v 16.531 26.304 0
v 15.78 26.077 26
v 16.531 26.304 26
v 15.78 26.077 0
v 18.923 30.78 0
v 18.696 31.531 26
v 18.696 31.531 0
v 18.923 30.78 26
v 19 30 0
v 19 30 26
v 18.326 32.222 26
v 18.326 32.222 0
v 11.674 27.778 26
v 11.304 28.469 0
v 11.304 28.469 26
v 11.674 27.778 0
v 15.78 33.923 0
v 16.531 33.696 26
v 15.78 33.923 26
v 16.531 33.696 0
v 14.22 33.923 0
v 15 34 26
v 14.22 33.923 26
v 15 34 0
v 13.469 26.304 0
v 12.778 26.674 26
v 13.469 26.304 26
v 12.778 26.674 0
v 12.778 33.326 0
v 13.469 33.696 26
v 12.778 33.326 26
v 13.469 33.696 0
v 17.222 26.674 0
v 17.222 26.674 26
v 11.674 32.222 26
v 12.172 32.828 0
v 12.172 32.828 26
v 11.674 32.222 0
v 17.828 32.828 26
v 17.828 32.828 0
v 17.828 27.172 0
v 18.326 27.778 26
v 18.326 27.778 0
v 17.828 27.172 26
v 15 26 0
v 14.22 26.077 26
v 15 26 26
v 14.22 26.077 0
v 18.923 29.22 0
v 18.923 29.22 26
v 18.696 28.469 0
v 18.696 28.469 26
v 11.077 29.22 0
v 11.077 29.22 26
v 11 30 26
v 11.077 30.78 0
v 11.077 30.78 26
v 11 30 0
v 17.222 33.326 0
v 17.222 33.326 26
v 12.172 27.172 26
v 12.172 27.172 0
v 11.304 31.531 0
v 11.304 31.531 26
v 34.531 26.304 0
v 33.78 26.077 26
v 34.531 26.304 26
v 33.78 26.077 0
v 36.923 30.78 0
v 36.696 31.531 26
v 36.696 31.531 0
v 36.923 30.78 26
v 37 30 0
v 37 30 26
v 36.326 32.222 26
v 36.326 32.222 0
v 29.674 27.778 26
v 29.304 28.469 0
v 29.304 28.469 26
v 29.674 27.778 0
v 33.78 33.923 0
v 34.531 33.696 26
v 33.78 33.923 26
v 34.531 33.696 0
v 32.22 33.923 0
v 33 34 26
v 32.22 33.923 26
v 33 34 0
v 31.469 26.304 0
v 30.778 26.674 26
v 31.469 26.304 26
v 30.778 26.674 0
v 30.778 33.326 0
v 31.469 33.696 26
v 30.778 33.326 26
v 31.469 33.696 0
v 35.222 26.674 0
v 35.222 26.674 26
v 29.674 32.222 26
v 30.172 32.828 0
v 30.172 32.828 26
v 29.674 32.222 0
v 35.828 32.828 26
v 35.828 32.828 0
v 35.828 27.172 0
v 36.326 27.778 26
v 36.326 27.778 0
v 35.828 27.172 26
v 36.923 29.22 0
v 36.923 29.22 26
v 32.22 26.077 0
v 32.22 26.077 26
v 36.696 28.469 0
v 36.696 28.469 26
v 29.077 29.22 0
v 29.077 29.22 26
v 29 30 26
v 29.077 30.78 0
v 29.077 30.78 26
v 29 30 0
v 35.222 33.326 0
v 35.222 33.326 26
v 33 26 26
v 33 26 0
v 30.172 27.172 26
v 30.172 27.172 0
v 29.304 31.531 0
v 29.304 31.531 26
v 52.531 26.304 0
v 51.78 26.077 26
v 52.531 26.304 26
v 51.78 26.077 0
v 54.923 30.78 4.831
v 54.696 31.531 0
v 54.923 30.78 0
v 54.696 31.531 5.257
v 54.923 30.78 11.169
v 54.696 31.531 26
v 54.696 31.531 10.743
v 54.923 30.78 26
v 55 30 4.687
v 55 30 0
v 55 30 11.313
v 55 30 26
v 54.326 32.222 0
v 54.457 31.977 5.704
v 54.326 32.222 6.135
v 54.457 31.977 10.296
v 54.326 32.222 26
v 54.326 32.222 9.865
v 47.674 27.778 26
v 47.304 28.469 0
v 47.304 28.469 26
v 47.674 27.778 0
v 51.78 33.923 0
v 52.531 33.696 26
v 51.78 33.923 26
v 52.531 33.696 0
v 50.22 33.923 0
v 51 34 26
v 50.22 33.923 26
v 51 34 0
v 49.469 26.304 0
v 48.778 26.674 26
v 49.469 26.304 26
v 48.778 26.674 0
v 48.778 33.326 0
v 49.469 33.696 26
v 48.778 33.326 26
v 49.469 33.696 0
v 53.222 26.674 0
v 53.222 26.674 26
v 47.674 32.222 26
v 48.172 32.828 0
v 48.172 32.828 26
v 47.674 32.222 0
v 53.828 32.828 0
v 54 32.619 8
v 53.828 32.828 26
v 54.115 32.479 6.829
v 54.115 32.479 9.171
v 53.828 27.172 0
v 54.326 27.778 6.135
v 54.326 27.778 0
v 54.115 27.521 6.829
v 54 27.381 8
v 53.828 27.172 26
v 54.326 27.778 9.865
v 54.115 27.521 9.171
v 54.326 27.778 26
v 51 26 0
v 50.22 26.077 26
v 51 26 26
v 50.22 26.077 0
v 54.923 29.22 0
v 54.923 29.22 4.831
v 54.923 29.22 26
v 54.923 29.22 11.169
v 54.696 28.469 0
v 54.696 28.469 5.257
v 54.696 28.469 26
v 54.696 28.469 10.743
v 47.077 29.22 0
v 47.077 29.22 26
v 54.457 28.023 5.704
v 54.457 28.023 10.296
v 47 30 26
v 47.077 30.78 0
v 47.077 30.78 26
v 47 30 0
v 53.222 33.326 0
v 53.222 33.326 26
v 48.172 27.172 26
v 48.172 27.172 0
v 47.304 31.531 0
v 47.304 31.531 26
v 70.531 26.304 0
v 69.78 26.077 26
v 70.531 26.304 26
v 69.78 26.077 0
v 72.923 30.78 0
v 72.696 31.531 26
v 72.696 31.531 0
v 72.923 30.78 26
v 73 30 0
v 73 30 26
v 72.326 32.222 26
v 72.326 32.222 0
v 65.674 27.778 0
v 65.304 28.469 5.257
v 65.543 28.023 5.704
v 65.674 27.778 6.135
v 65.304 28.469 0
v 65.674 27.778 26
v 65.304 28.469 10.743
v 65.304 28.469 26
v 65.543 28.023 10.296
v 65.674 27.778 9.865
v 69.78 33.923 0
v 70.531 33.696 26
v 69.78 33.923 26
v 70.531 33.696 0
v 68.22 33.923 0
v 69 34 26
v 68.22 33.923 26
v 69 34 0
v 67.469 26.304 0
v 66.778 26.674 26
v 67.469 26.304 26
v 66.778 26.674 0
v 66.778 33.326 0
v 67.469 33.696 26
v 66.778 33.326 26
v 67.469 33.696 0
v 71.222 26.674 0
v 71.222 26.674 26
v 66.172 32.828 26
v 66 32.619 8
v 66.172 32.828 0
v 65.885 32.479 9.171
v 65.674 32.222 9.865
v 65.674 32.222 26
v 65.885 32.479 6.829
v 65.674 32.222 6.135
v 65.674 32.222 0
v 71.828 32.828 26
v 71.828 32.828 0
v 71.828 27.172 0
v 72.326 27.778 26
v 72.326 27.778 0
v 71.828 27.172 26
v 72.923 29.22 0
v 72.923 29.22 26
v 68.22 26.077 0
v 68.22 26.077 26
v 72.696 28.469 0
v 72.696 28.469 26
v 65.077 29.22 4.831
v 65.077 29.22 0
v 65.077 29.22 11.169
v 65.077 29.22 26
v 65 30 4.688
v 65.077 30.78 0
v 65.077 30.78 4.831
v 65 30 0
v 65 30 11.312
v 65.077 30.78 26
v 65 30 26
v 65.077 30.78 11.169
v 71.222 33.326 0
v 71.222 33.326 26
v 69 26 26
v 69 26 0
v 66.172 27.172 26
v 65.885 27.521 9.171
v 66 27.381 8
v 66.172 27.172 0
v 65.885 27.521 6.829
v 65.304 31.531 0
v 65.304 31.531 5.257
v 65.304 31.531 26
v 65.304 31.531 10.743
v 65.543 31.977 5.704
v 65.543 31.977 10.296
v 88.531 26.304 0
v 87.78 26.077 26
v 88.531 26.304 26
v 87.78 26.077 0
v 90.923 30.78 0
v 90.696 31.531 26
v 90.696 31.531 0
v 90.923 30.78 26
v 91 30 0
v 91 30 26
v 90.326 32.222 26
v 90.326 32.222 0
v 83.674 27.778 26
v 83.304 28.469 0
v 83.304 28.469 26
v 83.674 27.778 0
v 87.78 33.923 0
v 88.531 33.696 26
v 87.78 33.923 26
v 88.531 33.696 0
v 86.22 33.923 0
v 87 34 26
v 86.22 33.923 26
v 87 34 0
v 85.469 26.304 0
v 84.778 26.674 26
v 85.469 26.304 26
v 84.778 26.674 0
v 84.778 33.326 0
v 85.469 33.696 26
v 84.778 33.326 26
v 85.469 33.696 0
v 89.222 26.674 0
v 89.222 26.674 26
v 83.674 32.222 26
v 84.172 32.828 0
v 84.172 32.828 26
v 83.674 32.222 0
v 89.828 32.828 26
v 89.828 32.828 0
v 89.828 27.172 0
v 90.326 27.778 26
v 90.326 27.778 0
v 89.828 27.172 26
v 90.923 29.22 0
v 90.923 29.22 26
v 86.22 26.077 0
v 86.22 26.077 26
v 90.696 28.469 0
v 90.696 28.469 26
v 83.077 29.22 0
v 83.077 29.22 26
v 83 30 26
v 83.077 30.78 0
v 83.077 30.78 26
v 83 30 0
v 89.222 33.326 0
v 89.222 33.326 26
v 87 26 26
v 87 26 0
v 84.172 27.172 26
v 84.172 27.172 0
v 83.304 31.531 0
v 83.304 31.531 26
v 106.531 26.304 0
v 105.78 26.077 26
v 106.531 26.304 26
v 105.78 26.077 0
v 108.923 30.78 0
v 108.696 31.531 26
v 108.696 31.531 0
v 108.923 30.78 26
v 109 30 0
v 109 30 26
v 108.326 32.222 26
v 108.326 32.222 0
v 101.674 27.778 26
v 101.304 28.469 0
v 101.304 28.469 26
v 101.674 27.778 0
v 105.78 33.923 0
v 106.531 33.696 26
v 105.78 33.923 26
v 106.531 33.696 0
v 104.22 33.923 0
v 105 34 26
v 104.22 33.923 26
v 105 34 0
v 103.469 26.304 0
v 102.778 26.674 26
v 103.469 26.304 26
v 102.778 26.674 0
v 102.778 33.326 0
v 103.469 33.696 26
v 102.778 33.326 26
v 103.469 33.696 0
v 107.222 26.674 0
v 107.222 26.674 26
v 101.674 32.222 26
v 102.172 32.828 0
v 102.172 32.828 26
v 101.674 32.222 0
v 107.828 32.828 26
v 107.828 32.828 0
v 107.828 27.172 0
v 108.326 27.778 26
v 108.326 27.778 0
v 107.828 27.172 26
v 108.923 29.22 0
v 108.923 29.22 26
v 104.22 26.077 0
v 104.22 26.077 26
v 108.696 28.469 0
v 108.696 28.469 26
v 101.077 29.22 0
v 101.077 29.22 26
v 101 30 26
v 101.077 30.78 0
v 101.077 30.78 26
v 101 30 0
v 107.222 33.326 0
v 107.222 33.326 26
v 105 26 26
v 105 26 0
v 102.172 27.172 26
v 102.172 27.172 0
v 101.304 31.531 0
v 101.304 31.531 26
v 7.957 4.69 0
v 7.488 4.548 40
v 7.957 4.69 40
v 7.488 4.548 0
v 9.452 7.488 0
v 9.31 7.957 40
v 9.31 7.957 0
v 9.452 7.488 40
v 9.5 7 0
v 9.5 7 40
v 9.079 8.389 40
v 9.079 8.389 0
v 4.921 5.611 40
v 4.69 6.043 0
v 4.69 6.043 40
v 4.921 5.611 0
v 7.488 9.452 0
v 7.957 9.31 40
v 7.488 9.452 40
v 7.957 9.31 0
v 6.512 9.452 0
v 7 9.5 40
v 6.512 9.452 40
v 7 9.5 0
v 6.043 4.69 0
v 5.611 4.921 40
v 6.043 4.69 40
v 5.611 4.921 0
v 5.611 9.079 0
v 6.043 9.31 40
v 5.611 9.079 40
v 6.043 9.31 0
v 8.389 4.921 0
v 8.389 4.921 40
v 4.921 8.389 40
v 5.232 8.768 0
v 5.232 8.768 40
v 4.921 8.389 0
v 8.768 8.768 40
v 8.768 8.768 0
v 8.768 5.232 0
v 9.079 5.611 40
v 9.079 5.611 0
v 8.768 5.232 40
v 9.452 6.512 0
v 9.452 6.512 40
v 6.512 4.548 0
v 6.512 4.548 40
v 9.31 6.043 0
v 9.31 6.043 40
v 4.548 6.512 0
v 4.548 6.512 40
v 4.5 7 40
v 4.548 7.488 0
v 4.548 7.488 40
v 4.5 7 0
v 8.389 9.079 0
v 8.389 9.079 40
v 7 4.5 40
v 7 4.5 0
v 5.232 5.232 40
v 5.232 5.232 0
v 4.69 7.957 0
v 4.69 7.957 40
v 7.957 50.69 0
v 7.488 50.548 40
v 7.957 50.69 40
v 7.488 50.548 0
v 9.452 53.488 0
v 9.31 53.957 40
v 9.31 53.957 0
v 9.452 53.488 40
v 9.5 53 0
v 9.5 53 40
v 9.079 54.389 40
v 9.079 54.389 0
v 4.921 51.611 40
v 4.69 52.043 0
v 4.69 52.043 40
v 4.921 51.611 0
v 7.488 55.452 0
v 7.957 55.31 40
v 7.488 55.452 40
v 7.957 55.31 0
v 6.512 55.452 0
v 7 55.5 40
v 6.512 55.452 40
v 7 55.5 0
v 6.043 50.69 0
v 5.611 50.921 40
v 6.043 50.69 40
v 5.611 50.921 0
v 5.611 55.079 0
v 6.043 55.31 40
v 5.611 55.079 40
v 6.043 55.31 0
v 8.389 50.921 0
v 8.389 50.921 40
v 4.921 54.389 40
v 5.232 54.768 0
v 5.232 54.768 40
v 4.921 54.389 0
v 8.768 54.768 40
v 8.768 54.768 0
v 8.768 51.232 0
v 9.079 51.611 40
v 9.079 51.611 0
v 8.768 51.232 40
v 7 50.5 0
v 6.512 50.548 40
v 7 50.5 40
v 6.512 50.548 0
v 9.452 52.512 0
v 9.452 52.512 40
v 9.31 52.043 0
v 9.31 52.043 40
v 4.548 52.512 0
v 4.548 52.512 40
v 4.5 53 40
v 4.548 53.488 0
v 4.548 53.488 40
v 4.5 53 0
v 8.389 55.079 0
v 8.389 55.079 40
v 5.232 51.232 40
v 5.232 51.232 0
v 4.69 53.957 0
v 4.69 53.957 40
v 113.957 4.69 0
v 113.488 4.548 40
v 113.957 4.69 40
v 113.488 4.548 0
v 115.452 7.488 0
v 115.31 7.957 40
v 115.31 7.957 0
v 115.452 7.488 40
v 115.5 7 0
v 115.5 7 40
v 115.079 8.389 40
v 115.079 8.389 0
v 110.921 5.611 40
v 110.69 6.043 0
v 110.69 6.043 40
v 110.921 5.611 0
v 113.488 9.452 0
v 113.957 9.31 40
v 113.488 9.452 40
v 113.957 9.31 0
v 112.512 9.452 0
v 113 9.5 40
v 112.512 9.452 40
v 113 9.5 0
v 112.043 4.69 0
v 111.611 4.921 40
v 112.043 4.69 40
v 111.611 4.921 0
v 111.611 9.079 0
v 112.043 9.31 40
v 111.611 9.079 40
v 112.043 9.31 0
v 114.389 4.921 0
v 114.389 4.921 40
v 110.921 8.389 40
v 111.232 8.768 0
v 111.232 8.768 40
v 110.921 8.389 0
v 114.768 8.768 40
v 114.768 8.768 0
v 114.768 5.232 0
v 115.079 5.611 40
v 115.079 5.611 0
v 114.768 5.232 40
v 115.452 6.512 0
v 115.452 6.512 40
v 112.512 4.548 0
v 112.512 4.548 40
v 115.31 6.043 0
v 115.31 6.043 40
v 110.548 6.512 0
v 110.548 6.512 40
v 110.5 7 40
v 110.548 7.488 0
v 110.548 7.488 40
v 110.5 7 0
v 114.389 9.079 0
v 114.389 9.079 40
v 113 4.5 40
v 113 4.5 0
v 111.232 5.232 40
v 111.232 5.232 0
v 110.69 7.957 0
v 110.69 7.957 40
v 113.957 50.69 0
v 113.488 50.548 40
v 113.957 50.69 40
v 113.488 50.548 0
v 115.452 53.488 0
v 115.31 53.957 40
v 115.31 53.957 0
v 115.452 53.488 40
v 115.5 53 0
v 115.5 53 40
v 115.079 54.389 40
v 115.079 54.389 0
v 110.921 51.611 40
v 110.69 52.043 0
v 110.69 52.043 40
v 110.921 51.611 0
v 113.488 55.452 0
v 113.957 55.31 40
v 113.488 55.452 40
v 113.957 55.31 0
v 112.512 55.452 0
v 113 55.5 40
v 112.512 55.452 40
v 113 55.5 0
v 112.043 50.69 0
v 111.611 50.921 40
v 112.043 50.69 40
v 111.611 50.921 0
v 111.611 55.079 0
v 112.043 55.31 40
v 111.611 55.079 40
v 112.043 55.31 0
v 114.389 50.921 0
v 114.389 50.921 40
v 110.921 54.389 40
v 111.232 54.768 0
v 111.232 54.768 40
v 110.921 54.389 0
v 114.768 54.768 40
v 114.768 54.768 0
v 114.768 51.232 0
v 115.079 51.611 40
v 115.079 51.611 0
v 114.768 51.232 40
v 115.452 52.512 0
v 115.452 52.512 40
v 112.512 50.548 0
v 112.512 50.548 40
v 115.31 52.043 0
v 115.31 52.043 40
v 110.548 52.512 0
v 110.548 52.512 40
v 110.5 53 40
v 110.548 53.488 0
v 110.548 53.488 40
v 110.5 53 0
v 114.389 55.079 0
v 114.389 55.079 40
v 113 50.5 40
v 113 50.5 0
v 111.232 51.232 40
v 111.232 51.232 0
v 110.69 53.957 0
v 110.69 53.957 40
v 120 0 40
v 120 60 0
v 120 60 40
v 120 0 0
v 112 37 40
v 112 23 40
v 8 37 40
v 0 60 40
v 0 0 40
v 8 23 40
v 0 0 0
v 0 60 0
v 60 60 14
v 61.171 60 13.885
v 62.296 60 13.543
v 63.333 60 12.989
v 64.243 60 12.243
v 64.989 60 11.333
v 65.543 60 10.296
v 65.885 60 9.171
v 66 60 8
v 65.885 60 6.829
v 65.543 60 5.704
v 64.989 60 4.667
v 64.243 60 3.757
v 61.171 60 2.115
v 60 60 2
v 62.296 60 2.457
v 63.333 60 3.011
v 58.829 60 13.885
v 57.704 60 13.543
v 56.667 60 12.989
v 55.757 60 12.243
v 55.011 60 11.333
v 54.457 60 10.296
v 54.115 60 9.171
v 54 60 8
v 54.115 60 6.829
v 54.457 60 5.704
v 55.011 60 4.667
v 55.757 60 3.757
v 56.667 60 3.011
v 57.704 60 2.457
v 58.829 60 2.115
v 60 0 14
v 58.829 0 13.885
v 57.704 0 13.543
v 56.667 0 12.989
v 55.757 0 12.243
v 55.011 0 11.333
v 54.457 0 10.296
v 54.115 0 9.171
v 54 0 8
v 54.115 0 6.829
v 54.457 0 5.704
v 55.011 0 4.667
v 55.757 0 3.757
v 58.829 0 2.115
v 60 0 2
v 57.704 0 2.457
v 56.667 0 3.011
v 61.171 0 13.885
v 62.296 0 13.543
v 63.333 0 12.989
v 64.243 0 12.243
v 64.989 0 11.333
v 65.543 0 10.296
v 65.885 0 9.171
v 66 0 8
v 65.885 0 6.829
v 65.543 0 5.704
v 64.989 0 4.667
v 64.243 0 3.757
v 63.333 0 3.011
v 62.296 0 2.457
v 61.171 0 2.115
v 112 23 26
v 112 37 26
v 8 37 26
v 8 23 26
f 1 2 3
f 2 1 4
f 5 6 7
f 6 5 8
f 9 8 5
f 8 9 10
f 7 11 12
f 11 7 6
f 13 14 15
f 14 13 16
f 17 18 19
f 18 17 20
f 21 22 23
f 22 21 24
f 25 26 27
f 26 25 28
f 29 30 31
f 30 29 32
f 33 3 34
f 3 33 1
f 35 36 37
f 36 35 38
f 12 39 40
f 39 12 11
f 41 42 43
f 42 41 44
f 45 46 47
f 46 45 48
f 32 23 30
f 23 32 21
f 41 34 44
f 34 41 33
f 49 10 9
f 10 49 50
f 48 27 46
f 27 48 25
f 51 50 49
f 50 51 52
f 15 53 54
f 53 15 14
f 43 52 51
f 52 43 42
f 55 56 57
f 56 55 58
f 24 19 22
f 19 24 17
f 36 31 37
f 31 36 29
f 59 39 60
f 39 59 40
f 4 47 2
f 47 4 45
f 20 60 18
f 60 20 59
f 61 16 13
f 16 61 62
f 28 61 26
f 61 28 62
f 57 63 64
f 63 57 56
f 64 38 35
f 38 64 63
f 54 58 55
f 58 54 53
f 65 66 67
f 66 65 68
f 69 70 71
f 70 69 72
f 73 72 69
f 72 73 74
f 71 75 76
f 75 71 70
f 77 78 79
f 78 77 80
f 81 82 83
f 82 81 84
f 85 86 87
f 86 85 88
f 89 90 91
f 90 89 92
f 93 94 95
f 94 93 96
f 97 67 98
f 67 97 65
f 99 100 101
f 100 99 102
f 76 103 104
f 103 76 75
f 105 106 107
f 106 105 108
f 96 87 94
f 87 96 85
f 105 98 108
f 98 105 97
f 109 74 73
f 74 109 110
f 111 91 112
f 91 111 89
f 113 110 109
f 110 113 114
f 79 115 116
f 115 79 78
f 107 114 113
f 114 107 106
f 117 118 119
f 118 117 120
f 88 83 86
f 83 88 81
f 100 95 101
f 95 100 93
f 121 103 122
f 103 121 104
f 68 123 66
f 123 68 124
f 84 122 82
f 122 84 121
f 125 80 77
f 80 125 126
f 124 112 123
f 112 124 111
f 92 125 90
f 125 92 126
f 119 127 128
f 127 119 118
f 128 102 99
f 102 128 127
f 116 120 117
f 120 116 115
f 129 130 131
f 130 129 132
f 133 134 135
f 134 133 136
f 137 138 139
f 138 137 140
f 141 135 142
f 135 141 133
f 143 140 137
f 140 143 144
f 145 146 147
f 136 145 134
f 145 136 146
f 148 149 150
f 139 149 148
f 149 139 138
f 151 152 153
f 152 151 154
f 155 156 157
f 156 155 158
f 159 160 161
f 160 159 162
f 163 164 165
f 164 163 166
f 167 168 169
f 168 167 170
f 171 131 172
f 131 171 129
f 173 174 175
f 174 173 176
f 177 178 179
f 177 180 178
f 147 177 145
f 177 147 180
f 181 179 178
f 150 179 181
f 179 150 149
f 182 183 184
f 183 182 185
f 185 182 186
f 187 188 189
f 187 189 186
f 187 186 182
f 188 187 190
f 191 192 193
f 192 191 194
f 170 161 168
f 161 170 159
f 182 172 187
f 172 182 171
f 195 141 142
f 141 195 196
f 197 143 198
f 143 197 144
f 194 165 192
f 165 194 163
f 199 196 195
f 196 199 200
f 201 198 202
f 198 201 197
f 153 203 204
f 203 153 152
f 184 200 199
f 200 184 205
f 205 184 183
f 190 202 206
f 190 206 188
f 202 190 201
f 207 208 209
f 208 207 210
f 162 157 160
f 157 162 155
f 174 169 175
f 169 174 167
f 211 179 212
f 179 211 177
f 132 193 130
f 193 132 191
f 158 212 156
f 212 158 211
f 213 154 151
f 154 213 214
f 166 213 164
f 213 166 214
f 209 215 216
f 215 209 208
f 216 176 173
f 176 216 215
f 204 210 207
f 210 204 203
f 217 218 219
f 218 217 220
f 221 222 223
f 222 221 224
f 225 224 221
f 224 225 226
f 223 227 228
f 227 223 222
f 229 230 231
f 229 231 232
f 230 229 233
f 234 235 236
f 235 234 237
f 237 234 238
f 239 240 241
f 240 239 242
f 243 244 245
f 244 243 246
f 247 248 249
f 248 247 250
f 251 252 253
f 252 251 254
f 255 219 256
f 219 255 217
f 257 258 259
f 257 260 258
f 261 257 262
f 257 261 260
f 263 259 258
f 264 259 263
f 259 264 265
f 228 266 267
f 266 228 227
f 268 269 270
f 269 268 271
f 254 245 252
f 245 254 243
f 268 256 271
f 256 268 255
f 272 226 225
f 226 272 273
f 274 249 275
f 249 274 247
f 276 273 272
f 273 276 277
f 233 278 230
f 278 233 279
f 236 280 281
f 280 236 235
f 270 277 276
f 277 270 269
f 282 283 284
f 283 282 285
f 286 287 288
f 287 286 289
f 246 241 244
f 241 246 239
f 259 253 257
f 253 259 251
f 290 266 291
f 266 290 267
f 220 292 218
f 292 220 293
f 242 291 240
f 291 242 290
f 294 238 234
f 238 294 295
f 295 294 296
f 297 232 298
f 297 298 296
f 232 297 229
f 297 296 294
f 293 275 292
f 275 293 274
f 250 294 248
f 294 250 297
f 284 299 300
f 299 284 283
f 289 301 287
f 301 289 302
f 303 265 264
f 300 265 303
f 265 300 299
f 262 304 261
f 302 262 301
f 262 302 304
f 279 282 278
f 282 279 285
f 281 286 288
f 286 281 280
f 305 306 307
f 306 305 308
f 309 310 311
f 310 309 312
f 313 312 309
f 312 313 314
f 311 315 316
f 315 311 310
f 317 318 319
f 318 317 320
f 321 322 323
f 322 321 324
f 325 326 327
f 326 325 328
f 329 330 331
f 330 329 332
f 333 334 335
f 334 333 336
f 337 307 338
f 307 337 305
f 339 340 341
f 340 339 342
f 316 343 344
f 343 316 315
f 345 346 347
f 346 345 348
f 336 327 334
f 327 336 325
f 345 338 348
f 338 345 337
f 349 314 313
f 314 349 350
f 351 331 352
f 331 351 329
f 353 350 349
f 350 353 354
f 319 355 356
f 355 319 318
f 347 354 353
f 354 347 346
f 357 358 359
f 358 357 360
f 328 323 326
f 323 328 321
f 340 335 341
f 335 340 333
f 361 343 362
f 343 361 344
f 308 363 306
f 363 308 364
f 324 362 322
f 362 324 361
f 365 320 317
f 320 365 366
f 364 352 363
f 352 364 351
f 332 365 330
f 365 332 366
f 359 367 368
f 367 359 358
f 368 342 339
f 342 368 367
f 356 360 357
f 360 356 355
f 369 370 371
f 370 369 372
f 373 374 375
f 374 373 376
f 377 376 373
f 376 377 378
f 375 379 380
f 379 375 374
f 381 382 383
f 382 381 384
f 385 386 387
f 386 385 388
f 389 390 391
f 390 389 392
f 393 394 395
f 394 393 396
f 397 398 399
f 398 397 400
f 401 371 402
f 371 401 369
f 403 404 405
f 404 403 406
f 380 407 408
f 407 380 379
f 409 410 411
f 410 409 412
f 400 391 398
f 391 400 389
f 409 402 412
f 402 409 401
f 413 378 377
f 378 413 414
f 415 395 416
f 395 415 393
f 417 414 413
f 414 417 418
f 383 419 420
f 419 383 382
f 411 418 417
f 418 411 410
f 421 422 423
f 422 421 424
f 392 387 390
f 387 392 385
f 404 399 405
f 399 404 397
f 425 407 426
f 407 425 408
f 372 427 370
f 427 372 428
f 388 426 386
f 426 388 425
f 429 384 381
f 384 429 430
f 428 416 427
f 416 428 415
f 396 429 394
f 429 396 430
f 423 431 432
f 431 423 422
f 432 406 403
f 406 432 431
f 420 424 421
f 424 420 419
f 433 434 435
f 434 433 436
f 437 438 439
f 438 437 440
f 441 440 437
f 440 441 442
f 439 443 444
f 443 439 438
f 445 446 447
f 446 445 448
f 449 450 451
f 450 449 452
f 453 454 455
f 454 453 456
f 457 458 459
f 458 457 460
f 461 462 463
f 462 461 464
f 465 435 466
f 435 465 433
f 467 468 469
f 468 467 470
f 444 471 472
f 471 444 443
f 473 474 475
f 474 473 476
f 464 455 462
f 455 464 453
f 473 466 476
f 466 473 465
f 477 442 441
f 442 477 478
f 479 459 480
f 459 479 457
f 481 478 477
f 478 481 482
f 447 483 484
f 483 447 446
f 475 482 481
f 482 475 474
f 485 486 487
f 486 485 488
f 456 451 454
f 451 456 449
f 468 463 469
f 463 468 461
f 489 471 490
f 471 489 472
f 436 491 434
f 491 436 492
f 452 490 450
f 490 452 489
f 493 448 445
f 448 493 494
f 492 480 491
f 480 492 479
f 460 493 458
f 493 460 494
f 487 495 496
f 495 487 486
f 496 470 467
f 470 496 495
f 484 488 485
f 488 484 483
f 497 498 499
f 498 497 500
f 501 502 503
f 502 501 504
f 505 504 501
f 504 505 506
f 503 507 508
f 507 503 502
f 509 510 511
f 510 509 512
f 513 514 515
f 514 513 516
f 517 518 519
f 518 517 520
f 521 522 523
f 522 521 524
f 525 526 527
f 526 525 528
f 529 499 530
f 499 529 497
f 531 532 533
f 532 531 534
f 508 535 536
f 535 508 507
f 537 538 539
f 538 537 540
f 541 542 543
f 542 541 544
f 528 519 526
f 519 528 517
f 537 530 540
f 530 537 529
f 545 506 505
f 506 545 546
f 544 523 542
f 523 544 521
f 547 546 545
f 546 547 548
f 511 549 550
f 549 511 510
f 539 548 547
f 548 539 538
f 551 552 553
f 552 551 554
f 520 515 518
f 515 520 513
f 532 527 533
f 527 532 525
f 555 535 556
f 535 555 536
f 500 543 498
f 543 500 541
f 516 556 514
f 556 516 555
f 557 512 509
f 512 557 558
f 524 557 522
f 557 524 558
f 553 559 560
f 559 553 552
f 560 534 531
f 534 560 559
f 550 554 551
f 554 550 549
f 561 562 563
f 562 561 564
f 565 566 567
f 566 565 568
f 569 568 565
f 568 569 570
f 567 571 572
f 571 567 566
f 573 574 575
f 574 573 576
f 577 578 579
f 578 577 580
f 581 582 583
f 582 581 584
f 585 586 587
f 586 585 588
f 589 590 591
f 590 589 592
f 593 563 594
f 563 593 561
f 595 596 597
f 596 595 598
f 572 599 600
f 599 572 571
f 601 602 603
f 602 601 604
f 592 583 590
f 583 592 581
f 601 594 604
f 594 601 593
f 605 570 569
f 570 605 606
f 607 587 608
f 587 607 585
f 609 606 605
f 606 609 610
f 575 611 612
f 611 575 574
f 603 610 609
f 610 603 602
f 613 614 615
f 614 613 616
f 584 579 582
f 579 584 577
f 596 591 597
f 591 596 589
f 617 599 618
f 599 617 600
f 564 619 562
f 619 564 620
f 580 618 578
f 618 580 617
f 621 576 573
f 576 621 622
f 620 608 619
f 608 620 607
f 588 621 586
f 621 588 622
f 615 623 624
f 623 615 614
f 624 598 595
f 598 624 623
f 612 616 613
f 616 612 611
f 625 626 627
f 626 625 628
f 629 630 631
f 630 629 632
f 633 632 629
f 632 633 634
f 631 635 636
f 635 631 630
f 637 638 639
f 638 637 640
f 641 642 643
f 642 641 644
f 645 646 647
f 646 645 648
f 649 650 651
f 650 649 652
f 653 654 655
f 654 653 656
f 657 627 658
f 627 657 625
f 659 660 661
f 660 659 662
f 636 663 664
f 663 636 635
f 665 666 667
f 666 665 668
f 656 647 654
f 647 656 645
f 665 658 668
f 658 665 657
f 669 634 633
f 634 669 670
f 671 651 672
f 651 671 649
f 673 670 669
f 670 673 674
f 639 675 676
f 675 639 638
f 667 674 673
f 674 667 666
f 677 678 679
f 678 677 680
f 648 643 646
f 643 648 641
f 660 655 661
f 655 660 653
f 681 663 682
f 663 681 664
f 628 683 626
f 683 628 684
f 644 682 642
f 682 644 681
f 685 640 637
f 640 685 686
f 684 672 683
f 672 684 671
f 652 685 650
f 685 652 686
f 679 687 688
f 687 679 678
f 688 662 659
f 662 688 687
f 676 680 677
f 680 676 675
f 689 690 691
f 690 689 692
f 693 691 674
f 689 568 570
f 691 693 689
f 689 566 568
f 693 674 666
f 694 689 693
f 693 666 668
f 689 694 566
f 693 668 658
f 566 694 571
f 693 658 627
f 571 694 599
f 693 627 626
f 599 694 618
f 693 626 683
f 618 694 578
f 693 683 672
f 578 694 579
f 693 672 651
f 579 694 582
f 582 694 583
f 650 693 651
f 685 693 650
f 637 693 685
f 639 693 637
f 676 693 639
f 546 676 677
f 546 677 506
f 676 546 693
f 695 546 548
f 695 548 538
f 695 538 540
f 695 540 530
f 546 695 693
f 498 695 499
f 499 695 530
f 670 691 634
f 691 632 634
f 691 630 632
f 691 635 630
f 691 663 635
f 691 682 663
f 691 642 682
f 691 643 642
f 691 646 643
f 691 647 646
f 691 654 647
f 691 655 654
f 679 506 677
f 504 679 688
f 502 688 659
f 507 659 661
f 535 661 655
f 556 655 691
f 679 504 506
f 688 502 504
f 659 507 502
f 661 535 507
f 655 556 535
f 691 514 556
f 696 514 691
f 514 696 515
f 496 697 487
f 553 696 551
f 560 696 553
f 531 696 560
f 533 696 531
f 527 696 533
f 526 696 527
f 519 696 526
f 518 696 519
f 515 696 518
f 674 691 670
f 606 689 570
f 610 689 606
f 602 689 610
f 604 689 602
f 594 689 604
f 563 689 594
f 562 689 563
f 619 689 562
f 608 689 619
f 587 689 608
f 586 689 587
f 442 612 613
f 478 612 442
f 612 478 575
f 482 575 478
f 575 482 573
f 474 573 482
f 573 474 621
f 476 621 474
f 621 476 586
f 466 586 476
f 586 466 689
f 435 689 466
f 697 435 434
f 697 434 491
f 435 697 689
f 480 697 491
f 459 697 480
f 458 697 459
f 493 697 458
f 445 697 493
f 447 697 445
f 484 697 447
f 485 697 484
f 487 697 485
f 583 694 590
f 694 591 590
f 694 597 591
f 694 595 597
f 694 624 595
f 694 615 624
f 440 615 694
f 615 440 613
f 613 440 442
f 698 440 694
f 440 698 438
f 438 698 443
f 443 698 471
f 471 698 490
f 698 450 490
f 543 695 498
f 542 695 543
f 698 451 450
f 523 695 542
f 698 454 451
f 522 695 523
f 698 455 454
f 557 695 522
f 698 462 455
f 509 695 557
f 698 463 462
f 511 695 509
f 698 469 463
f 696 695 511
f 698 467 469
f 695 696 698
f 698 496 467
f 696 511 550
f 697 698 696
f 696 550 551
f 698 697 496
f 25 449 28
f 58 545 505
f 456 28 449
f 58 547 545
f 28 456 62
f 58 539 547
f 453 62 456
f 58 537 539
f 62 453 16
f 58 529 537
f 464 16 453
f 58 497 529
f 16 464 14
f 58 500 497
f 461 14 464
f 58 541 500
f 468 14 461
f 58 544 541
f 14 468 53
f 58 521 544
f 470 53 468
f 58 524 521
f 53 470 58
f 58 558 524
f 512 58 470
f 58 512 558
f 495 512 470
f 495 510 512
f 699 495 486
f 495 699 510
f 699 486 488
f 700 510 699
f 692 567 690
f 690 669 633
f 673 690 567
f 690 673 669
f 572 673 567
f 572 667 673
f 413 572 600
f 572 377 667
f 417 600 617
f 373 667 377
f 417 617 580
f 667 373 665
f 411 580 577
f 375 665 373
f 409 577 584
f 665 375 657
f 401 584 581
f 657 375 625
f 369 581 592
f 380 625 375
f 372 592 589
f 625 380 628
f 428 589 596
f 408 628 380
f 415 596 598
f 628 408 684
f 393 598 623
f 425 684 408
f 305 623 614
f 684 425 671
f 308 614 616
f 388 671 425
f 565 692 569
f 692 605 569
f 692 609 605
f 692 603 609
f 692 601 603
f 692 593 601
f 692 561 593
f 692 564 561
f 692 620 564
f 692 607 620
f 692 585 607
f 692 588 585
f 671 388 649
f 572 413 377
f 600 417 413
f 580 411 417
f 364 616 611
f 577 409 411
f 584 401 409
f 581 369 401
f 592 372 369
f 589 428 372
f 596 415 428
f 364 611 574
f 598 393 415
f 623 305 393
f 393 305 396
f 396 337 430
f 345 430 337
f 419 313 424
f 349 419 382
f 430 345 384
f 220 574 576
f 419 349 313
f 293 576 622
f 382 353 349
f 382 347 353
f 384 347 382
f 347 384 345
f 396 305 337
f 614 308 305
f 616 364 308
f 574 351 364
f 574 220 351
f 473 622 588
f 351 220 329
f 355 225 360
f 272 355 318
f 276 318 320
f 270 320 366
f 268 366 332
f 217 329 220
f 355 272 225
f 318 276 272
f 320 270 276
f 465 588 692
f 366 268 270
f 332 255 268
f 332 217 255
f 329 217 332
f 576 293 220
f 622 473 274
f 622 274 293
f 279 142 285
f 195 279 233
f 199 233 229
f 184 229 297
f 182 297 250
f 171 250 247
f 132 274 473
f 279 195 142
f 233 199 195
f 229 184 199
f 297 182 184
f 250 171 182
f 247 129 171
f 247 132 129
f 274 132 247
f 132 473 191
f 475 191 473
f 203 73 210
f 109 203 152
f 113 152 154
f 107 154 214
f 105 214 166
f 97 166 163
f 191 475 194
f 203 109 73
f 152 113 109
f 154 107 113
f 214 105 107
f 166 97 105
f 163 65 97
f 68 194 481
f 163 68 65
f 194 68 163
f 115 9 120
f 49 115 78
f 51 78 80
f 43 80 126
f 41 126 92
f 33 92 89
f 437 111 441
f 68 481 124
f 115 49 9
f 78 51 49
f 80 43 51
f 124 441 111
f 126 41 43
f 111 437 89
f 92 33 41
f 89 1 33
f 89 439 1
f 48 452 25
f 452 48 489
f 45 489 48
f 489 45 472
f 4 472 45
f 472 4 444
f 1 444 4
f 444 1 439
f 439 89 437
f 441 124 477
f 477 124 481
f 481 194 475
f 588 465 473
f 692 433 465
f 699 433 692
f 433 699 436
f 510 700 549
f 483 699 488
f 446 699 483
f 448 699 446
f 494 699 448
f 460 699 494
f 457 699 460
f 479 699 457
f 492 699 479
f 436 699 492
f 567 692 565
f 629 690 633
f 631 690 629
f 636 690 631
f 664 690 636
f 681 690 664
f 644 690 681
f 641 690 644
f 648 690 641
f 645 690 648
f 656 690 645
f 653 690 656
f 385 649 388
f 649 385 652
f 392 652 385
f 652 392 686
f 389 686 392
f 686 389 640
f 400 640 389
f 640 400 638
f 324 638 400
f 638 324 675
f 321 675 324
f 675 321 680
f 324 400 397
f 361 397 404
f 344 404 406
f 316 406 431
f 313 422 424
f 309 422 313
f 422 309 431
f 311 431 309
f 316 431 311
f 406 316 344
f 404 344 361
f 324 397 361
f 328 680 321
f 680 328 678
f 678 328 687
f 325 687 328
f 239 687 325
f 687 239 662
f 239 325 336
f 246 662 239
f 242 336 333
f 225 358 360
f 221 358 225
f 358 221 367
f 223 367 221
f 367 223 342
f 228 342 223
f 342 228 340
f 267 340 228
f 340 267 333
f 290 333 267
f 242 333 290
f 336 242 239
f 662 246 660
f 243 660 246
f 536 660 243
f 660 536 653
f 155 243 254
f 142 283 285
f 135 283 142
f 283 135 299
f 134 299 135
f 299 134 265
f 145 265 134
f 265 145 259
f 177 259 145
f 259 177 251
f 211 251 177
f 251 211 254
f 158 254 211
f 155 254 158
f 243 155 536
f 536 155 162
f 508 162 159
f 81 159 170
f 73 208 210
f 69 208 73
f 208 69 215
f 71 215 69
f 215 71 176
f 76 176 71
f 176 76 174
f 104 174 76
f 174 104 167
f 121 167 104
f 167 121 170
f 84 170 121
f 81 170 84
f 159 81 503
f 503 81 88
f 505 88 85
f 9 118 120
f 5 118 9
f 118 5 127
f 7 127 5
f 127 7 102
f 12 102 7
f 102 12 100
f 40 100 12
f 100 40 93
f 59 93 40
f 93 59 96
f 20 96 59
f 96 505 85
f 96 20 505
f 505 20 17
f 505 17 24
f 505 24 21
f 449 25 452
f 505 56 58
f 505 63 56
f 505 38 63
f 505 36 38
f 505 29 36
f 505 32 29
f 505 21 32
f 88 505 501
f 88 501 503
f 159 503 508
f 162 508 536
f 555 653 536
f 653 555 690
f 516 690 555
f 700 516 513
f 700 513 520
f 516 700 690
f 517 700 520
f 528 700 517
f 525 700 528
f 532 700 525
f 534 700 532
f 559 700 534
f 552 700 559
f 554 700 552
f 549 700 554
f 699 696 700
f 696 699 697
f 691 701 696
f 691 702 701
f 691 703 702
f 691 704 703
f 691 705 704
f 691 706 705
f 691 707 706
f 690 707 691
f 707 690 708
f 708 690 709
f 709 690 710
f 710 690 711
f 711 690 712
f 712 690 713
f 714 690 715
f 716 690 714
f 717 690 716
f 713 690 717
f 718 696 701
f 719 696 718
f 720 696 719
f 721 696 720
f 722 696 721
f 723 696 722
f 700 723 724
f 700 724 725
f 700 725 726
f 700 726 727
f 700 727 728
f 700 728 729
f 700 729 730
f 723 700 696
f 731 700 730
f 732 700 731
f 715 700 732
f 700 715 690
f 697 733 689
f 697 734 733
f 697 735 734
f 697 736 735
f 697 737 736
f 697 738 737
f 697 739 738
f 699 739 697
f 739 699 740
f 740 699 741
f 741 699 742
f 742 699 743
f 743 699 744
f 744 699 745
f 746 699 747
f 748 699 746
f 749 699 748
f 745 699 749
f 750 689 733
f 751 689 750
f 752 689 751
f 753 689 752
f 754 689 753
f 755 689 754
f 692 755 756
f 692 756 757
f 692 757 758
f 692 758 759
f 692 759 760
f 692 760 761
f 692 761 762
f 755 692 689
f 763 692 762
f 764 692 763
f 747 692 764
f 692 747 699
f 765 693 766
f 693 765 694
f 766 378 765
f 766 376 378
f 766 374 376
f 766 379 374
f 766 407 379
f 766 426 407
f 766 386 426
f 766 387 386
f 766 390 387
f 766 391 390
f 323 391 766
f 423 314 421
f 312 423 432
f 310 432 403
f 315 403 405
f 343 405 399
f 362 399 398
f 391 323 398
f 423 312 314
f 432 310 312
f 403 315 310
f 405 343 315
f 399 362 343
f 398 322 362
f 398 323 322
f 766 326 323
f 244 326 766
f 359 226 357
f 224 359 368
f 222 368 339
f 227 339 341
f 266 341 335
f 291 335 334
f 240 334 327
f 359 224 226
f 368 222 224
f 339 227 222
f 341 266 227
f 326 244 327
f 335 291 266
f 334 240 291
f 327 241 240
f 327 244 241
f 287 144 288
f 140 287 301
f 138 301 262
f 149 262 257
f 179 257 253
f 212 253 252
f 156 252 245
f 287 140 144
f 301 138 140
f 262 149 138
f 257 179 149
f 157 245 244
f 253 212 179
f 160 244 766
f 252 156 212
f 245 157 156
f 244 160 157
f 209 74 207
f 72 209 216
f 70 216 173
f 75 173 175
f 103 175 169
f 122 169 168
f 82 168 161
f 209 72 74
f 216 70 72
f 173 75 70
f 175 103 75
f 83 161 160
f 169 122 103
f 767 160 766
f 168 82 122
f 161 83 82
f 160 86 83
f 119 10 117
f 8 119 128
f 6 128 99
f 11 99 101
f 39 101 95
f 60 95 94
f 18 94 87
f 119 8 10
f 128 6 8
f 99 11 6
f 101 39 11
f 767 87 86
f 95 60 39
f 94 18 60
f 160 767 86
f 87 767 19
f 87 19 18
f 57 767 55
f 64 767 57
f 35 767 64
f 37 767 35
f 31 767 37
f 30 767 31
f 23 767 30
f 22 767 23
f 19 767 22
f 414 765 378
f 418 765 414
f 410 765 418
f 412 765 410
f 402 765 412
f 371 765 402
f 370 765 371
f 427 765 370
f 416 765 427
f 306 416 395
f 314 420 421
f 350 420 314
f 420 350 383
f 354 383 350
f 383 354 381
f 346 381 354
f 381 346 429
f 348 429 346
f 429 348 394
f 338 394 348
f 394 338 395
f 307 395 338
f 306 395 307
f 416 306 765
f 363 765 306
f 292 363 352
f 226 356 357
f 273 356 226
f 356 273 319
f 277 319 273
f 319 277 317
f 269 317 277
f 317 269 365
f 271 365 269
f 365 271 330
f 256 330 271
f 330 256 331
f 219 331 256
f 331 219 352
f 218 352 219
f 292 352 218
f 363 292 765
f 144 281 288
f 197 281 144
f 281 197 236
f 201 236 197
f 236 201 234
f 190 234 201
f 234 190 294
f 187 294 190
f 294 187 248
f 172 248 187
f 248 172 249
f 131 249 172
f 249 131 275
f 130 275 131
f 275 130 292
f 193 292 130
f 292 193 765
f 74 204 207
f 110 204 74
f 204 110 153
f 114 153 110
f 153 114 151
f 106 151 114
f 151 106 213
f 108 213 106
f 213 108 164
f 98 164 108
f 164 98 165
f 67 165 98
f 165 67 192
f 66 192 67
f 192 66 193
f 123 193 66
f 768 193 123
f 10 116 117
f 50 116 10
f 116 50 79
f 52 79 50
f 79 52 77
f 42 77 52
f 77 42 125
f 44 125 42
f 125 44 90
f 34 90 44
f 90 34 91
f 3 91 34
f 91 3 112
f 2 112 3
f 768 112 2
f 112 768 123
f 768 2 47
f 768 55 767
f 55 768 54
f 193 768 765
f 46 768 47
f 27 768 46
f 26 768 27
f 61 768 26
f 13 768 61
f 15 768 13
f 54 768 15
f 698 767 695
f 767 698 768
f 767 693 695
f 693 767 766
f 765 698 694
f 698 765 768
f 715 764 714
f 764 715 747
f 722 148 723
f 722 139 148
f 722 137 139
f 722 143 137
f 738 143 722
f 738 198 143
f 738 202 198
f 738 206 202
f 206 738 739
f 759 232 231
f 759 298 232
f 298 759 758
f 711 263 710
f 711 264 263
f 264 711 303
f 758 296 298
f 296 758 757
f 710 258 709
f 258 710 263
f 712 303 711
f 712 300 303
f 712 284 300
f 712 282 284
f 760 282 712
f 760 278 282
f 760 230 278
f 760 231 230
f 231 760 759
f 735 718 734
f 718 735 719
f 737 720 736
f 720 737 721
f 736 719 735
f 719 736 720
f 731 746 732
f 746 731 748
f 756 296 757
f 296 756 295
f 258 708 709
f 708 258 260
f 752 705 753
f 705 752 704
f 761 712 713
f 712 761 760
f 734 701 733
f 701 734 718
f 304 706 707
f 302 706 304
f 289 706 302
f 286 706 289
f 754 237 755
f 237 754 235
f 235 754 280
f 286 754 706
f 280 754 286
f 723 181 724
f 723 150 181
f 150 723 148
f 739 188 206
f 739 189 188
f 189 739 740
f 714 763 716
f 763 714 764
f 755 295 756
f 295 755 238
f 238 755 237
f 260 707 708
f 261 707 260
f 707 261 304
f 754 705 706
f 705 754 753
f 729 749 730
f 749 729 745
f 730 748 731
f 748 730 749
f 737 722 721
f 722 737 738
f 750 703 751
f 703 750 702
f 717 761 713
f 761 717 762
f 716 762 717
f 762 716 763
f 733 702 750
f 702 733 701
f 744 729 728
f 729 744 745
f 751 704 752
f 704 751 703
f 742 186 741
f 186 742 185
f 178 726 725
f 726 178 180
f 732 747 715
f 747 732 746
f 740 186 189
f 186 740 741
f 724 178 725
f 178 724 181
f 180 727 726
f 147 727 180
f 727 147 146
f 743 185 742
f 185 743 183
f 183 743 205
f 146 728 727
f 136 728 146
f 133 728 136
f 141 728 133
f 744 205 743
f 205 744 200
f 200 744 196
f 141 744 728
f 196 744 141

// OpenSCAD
$fn = 32;

// ----------------------------------------------------------------------
// Manifold block: side_outlet manifold
// ----------------------------------------------------------------------

// --- parameters (mm) ---
block_l = 120;            // block length, X
block_w = 60;             // block width, Y
block_h = 40;             // block height, Z
port_d = 8;               // port bore diameter
port_pitch = 18;          // port pitch along X
gallery_d = 14;           // top gallery width, Y
gallery_depth = 14;       // gallery pocket depth
wall_p = 8;               // gallery end wall thickness, X
mnt_d = 5;                // mounting hole diameter
mnt_in = 7;               // mounting hole inset from the edges
out_d = 12;               // outlet bore diameter
out_z = 8;                // outlet axis height

n_ports = 6;  // ports in the row
port_x0 = (block_l - (n_ports - 1) * port_pitch) / 2;  // first port X

difference() {
  cube([block_l, block_w, block_h]);
  for (i = [0 : n_ports - 1])
    translate([port_x0 + i * port_pitch, block_w / 2, -1])
      cylinder(h = block_h + 2, d = port_d);
  translate([wall_p, block_w / 2 - gallery_d / 2, block_h - gallery_depth])
    cube([block_l - 2 * wall_p, gallery_d, gallery_depth + 1]);
  for (cx = [mnt_in, block_l - mnt_in])
    for (cy = [mnt_in, block_w - mnt_in])
      translate([cx, cy, -1]) cylinder(h = block_h + 2, d = mnt_d);
  translate([block_l / 2, -1, out_z]) rotate([-90, 0, 0])
    cylinder(h = block_w + 2, d = out_d);
}
